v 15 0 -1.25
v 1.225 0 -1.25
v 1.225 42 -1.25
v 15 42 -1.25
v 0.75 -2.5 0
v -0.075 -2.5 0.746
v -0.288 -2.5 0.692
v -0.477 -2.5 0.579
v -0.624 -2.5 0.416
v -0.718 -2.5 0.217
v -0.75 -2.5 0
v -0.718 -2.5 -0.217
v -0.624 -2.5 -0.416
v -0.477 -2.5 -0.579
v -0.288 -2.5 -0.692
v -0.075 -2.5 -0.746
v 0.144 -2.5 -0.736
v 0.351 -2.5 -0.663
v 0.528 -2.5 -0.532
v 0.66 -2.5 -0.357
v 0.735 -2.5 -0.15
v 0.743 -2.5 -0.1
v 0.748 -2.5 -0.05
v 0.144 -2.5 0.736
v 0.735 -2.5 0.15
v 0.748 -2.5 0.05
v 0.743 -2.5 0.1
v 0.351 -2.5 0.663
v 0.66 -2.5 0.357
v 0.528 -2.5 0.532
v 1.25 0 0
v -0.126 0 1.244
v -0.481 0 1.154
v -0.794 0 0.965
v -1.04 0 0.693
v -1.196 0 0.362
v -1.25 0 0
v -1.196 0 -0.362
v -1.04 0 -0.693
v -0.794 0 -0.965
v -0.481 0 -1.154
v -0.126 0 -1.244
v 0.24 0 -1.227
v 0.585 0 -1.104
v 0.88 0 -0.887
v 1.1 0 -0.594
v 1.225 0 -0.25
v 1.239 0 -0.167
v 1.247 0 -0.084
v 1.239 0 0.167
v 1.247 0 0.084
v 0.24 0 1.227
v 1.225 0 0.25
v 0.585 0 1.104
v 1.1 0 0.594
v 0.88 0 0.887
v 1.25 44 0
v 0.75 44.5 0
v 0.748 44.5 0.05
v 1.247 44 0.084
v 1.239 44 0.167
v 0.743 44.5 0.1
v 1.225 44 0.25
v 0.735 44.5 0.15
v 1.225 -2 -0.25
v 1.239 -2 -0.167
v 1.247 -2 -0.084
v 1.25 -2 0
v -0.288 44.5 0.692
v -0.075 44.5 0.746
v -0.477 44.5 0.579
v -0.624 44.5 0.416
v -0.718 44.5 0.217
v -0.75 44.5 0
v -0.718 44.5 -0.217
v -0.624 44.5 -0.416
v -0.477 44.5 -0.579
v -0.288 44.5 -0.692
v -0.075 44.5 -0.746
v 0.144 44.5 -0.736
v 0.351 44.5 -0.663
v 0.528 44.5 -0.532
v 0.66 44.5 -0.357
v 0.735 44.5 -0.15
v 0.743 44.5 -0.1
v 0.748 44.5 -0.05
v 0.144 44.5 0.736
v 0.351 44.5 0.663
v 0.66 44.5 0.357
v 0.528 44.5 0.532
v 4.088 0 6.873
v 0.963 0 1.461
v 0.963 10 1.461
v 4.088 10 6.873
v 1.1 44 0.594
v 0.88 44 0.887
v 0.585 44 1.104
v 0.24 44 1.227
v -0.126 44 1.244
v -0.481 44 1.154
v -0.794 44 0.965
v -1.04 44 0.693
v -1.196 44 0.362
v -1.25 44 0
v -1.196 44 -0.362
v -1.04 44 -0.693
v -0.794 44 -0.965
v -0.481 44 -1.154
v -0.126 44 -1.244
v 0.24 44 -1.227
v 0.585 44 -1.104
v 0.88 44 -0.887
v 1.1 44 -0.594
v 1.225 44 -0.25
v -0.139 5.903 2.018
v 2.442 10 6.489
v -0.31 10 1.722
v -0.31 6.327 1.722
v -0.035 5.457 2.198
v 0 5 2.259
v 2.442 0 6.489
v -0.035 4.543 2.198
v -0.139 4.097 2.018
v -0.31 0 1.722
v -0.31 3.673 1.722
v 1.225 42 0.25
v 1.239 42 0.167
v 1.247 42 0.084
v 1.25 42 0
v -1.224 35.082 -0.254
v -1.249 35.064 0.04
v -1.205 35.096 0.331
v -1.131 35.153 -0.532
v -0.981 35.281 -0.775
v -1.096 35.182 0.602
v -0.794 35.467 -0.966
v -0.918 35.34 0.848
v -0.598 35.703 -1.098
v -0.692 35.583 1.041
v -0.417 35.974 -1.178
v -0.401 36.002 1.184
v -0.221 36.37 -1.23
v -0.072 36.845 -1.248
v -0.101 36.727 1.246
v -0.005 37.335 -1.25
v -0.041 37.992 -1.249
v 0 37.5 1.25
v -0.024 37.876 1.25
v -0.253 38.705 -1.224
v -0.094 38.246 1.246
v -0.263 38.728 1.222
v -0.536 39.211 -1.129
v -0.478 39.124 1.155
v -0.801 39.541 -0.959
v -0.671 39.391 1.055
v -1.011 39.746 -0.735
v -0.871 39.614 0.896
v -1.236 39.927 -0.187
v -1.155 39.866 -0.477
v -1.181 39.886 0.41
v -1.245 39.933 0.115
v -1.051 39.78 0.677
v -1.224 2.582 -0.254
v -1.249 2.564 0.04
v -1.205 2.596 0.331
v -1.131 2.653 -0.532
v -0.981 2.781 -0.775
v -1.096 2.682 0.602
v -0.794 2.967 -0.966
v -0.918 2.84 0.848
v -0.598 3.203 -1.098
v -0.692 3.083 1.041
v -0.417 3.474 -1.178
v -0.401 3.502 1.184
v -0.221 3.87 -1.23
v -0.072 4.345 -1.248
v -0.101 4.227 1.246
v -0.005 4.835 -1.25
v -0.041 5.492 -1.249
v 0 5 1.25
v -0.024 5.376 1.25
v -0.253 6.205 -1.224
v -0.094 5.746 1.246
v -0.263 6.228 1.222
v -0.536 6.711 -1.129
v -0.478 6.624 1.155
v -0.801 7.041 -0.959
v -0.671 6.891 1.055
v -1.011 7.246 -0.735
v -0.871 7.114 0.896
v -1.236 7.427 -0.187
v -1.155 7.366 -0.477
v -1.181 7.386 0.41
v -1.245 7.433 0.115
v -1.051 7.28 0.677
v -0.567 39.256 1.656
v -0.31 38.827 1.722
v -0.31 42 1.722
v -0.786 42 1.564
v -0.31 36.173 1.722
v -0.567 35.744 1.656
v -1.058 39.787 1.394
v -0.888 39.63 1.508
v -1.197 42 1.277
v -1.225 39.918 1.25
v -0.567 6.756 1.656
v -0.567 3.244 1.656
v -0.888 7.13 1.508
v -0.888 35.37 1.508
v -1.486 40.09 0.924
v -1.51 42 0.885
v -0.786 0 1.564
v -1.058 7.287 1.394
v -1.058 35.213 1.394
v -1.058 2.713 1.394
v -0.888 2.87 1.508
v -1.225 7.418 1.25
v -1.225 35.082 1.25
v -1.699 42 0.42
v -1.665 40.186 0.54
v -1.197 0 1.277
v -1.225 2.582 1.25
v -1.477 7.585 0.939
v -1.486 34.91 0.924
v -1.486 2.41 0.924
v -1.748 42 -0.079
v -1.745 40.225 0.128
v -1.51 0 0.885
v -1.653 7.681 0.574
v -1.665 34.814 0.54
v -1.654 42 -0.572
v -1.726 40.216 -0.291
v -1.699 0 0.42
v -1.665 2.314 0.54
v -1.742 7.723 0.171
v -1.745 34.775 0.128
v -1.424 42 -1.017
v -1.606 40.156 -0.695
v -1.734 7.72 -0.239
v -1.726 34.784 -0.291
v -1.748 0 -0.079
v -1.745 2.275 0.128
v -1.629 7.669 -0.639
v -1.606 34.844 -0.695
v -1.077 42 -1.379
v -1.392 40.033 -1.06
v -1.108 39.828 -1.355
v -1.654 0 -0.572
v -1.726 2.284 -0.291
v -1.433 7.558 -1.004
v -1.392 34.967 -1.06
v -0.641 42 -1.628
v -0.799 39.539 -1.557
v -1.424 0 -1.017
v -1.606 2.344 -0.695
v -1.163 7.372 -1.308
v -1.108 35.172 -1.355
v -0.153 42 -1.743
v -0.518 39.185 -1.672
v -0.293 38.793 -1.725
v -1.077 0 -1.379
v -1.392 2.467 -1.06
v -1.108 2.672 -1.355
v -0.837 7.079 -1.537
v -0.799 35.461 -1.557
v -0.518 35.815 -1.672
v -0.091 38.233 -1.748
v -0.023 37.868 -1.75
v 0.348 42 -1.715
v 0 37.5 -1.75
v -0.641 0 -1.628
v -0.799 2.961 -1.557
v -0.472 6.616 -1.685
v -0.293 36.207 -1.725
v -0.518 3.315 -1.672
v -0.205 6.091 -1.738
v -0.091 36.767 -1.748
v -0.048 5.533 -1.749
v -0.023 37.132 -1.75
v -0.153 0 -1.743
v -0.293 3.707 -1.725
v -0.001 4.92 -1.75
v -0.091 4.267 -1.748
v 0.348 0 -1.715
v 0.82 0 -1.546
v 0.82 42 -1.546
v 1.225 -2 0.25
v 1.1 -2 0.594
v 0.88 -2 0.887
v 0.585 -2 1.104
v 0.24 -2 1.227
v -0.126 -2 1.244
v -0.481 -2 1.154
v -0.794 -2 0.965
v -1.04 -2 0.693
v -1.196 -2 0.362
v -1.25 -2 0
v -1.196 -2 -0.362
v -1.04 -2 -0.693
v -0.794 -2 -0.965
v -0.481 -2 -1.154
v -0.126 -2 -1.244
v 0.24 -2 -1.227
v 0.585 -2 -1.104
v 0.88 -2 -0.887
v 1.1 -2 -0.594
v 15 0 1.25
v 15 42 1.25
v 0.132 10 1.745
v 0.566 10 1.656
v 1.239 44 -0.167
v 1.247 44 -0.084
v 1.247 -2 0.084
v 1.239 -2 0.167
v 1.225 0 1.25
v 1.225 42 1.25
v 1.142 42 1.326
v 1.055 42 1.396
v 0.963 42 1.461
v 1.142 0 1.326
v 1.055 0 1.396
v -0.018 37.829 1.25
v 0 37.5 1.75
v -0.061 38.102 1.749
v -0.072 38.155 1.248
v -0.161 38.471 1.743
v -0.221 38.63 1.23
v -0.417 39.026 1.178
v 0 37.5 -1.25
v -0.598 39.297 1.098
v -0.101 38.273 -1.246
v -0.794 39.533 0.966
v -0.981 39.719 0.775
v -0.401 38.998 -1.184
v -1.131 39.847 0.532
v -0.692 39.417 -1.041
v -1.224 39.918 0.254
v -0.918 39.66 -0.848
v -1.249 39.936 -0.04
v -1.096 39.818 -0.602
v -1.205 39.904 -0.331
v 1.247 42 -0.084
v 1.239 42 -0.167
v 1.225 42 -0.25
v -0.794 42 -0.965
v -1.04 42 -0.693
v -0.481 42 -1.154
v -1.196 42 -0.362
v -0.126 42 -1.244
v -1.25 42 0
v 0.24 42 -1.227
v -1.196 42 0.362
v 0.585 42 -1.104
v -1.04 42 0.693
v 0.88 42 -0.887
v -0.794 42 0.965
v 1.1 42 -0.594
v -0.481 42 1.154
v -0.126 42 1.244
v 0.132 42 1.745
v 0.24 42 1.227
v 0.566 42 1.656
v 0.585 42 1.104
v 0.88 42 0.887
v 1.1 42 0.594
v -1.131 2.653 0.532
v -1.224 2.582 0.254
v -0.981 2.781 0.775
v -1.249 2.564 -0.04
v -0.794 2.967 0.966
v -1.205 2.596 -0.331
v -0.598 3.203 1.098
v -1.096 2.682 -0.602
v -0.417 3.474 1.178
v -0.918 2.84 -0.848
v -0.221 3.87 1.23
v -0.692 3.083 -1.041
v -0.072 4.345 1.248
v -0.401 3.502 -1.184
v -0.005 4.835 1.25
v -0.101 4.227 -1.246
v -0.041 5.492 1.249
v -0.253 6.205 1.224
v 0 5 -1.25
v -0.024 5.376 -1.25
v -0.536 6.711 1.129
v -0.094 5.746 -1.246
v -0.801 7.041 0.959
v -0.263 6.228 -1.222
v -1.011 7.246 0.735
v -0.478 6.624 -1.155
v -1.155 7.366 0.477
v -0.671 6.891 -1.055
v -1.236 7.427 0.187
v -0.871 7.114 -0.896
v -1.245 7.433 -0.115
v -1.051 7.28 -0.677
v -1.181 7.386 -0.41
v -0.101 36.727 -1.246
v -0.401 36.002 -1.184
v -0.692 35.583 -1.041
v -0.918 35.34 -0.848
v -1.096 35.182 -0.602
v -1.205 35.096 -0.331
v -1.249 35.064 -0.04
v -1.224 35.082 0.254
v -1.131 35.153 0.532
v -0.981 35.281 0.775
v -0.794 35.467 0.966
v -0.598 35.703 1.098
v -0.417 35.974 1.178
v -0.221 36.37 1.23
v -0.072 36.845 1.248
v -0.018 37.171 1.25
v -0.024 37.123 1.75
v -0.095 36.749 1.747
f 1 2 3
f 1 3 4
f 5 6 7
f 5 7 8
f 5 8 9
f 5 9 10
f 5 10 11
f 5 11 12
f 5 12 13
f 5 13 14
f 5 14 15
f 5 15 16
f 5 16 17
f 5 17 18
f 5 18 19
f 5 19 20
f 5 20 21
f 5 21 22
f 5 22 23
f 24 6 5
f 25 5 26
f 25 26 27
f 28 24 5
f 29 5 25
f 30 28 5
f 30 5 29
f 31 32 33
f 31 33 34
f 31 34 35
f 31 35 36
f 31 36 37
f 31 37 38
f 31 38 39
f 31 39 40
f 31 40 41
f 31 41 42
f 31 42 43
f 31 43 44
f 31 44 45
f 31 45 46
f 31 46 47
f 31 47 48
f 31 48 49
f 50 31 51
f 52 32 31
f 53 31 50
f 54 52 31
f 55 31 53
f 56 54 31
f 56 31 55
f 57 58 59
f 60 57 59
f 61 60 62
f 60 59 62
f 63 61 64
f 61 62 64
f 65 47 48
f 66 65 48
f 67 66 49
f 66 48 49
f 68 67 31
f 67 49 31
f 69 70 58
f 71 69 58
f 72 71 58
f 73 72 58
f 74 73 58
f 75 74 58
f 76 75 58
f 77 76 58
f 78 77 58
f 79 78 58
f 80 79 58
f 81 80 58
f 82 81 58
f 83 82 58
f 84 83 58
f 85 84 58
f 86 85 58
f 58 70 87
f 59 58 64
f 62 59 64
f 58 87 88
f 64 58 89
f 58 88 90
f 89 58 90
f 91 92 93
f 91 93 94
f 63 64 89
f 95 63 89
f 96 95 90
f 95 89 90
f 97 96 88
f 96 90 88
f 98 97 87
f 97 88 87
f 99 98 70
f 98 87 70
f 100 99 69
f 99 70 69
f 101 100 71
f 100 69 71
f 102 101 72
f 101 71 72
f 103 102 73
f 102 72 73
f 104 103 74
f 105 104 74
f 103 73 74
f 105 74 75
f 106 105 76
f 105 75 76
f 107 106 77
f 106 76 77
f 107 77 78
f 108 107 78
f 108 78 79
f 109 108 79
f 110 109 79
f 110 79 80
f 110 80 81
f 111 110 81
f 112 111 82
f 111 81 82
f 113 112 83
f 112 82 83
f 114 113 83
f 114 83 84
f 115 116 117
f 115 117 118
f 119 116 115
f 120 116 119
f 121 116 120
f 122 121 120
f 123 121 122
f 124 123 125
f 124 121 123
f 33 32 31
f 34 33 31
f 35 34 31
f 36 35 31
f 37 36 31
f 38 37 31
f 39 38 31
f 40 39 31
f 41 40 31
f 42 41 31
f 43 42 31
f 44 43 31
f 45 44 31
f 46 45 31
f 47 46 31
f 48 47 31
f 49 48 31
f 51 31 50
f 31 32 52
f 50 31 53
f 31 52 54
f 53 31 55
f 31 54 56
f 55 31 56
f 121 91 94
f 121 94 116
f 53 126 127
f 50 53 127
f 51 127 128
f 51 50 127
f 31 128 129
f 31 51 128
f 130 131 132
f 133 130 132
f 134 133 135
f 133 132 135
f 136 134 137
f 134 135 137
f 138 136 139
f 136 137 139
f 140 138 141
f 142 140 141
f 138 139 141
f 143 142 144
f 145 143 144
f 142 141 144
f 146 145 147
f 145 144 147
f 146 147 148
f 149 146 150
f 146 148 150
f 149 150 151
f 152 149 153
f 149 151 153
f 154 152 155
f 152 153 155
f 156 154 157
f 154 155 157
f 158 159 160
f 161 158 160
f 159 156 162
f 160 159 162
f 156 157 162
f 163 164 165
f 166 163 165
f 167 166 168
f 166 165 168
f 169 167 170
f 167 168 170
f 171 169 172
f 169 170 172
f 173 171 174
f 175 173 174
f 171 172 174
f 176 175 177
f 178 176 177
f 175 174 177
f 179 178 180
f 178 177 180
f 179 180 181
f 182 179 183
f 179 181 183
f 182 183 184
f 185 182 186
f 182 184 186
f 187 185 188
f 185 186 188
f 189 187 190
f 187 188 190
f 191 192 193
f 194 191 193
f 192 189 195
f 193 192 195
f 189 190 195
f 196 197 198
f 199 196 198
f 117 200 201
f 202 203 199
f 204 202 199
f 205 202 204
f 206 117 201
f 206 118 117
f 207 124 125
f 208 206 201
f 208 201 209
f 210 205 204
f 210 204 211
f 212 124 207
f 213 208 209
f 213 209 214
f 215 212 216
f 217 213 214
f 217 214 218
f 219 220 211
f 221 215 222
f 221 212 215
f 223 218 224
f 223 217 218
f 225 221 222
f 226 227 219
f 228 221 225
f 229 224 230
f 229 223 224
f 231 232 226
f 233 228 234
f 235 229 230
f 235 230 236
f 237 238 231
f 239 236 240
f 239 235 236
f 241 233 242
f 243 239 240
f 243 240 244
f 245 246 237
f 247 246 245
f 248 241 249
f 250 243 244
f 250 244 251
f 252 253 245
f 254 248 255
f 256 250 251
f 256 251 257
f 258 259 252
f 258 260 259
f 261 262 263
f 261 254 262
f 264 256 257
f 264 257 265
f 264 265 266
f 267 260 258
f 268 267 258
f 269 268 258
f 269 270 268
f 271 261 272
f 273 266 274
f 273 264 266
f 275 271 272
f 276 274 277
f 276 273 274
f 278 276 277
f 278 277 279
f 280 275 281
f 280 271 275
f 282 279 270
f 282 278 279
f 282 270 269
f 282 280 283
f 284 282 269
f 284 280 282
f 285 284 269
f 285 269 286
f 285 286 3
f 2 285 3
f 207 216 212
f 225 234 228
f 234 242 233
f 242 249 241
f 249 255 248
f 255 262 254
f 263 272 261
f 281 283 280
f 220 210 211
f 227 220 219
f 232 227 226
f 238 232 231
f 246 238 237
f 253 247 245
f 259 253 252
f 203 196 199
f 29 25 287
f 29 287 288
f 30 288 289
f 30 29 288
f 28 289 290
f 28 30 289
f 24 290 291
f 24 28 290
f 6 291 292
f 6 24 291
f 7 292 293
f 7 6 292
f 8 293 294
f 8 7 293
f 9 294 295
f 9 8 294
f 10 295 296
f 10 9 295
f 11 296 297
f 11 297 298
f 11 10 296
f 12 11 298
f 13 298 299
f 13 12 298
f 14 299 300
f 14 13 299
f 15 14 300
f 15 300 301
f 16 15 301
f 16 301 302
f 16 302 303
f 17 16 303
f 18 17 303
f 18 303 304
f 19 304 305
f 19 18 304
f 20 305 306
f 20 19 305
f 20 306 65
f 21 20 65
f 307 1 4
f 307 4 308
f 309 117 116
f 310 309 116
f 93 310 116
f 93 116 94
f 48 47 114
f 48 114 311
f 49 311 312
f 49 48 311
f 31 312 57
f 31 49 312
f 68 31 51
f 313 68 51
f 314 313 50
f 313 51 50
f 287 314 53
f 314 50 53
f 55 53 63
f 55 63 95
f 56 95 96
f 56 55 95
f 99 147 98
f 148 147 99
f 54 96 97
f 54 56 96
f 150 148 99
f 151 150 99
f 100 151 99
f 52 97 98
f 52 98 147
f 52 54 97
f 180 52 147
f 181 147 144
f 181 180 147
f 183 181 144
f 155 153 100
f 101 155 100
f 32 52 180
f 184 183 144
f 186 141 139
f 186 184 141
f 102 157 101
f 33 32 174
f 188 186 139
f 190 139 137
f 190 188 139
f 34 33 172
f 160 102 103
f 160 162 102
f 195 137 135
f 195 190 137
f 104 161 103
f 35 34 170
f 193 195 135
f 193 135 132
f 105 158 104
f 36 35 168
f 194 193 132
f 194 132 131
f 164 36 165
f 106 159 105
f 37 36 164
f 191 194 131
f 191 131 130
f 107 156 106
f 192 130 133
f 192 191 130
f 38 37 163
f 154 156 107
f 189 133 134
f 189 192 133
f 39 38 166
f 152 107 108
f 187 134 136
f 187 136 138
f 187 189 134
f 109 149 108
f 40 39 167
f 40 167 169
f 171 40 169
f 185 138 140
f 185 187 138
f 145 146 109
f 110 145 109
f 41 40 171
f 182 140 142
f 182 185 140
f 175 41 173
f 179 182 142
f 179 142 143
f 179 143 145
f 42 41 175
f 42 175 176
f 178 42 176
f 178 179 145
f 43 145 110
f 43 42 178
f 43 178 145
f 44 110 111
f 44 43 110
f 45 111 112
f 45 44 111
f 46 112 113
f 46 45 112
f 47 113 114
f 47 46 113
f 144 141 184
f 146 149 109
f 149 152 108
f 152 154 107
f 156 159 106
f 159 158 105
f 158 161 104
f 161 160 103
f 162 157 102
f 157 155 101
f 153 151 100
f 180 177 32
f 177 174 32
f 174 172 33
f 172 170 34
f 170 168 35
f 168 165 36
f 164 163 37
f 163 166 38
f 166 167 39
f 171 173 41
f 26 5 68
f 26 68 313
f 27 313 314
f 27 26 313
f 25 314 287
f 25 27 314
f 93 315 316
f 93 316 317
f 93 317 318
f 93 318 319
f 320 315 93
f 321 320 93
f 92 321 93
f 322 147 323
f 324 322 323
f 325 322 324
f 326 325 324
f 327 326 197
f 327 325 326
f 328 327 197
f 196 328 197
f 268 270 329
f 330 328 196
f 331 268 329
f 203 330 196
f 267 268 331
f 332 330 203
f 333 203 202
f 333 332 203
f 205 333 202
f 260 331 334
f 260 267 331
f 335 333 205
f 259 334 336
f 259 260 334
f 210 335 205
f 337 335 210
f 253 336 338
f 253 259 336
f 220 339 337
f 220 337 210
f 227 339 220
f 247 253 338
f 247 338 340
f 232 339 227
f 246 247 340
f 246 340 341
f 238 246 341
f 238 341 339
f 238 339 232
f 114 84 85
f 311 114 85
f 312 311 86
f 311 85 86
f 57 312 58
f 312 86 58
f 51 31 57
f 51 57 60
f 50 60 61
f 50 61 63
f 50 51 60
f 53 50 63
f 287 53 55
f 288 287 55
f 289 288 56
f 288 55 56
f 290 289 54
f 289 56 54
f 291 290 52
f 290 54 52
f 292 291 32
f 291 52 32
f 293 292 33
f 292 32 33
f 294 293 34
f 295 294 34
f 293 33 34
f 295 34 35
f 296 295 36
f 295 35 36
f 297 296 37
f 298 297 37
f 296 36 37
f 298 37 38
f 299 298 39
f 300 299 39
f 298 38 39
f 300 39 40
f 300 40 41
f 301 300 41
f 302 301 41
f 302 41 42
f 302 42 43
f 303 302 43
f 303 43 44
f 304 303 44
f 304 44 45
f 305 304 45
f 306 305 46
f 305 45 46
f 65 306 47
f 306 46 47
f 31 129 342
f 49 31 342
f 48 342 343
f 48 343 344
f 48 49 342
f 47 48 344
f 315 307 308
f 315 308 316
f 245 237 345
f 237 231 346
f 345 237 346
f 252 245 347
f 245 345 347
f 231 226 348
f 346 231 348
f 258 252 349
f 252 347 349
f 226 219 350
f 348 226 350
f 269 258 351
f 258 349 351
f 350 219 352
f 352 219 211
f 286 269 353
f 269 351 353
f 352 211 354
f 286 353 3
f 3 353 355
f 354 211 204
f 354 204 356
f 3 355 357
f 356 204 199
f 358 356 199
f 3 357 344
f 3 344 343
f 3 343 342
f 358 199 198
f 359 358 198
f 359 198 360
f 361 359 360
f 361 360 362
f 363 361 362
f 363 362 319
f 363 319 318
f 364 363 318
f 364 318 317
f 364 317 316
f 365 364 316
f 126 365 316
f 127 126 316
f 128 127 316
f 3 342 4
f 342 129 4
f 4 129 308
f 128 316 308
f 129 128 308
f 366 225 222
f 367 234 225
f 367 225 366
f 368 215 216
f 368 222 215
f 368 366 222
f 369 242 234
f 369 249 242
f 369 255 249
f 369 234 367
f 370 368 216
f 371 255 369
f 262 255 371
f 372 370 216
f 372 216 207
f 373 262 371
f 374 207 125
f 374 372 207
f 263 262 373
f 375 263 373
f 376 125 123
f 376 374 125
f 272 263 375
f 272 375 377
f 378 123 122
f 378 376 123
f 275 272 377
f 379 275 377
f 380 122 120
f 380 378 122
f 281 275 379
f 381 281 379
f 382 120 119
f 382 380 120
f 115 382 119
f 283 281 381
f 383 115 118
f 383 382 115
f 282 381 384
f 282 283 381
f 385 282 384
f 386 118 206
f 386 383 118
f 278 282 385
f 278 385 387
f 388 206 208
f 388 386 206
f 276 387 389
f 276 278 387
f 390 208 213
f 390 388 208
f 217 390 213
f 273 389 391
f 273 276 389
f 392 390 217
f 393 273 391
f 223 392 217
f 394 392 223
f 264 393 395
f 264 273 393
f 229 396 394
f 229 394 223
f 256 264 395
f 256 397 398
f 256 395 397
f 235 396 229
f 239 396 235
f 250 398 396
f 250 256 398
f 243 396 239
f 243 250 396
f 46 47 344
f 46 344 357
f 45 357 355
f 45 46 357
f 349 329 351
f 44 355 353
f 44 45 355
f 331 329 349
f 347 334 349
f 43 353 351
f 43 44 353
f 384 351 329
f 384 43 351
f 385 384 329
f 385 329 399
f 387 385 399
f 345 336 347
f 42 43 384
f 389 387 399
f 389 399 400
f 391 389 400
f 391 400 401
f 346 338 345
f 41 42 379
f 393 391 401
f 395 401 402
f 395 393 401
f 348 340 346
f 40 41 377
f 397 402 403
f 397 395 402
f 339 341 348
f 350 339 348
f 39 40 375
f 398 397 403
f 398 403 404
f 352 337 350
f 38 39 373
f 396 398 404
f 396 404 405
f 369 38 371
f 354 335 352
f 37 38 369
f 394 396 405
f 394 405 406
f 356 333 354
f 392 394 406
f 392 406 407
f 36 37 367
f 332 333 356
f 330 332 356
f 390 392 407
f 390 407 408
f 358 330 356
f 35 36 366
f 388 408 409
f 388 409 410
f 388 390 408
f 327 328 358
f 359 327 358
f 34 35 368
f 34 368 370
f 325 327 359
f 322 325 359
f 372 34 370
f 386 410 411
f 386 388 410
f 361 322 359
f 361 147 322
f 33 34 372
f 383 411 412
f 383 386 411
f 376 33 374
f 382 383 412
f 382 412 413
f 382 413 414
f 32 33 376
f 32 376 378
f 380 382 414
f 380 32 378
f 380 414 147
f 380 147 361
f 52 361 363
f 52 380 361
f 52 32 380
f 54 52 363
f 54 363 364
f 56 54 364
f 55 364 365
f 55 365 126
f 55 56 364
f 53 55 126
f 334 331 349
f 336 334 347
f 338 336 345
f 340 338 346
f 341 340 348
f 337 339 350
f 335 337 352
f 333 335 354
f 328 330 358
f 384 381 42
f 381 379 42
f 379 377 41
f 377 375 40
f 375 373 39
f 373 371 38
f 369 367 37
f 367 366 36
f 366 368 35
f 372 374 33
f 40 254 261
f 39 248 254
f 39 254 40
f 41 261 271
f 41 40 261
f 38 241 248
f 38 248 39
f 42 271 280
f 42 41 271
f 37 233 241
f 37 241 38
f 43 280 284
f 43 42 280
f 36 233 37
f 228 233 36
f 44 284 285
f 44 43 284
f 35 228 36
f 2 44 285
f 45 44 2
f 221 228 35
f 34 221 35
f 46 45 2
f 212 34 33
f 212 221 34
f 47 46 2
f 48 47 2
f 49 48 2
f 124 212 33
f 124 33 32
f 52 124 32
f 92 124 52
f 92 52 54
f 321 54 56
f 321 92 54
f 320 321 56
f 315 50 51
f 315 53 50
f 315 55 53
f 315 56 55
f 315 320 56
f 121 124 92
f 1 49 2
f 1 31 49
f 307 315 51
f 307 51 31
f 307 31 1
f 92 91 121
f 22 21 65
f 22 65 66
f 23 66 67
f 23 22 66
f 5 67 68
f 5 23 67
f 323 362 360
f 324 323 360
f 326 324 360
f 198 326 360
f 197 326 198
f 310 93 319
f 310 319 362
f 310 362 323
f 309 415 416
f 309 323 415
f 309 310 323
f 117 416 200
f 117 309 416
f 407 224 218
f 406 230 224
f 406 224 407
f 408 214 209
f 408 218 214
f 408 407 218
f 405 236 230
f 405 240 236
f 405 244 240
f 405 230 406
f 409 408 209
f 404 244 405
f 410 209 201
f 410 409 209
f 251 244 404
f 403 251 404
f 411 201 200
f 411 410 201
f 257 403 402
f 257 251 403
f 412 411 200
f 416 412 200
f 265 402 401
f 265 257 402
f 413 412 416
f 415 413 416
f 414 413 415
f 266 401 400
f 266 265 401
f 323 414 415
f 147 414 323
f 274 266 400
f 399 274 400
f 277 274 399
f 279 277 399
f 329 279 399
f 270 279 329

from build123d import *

# Parameters (mm, degrees)
F1_DEPTH      = 2.5
F2_SIZE       = 0.5
F3_DEPTH      = 42
F4_DEPTH      = 44.5
F5_SIZE       = 0.5
F7_DEPTH      = 10
F6_R          = 3
F8_DEPTH      = 10
F8_DEPTH_BACK = 10


with BuildPart() as f1:
    # F0 (on Front) → F1 (new body)
    with BuildSketch(Plane.XZ):
        with BuildLine():
            Line((1.2247448714, -0.25), (1.2247448714, 0.25))
            ThreePointArc((1.2247448714, 0.25), (-1.25, 0), (1.2247448714, -0.25))
        make_face()
        with BuildLine():
            ThreePointArc((1.25, 0), (1.2436701913, 0.1256362025), (1.2247448714, 0.25))
            Line((1.2247448714, 0.25), (1.2247448714, -0.25))
            ThreePointArc((1.2247448714, -0.25), (1.2436701913, -0.1256362025), (1.25, 0))
        make_face()
    extrude(amount=F1_DEPTH)

    # F2
    f2_edges = [f1.edges().sort_by_distance(p)[0] for p in [
        (-1.224745, -2.5, 0.25),
    ]]
    chamfer(f2_edges, length=F2_SIZE)

    # F0 (on Front) → F3 (join)
    with BuildSketch(Plane.XZ):
        with BuildLine():
            ThreePointArc((1.2247448714, 1.25), (1.6133510971, 0.6779367504), (1.75, 0))
            ThreePointArc((1.75, 0), (1.6133510971, -0.6779367504), (1.2247448714, -1.25))
            Line((1.2247448714, -1.25), (15, -1.25))
            Line((15, -1.25), (15, 1.25))
            Line((15, 1.25), (1.2247448714, 1.25))
        make_face()
        with BuildLine():
            Line((1.2247448714, 0.25), (1.2247448714, 1.25))
            ThreePointArc((1.2247448714, 1.25), (1.0990782163, 1.3618102197), (0.9632574662, 1.4610390323))
            ThreePointArc((0.9632574662, 1.4610390323), (0.3519402911, 1.7142456159), (-0.3096911027, 1.722379581))
            ThreePointArc((-0.3096911027, 1.722379581), (-1.5550212035, -0.8027509307), (1.2247448714, -1.25))
            Line((1.2247448714, -1.25), (1.2247448714, -0.25))
            ThreePointArc((1.2247448714, -0.25), (-1.25, 0), (1.2247448714, 0.25))
        make_face()
        with BuildLine():
            ThreePointArc((1.2247448714, -1.25), (1.6133510971, -0.6779367504), (1.75, 0))
            ThreePointArc((1.75, 0), (1.6133510971, 0.6779367504), (1.2247448714, 1.25))
            Line((1.2247448714, 1.25), (1.2247448714, 0.25))
            ThreePointArc((1.2247448714, 0.25), (1.2436701913, 0.1256362025), (1.25, 0))
            ThreePointArc((1.25, 0), (1.2436701913, -0.1256362025), (1.2247448714, -0.25))
            Line((1.2247448714, -0.25), (1.2247448714, -1.25))
        make_face()
    extrude(amount=-F3_DEPTH)

    # F0 (on Front) → F7 (join)
    with BuildSketch(Plane.XZ):
        with BuildLine():
            ThreePointArc((-0.3096911027, 1.722379581), (0.3519402911, 1.7142456159), (0.9632574662, 1.4610390323))
            Line((0.9632574662, 1.4610390323), (4.0880007002, 6.8732530742))
            Line((4.0880007002, 6.8732530742), (2.4424443742, 6.4892180562))
            Line((2.4424443742, 6.4892180562), (-0.3096911027, 1.722379581))
        make_face()
    extrude(amount=-F7_DEPTH)


with BuildPart() as f4:
    # F0 (on Front) → F4 (new body)
    with BuildSketch(Plane.XZ):
        with BuildLine():
            Line((1.2247448714, -0.25), (1.2247448714, 0.25))
            ThreePointArc((1.2247448714, 0.25), (-1.25, 0), (1.2247448714, -0.25))
        make_face()
        with BuildLine():
            ThreePointArc((1.25, 0), (1.2436701913, 0.1256362025), (1.2247448714, 0.25))
            Line((1.2247448714, 0.25), (1.2247448714, -0.25))
            ThreePointArc((1.2247448714, -0.25), (1.2436701913, -0.1256362025), (1.25, 0))
        make_face()
    extrude(amount=-F4_DEPTH)

    # F5
    f5_edges = [f4.edges().sort_by_distance(p)[0] for p in [
        (-1.224745, 44.5, 0.25),
    ]]
    chamfer(f5_edges, length=F5_SIZE)


with BuildPart() as f8_tool:
    # F6 (on face) → F8 (new body, two sides)
    with BuildSketch(Plane.XY.offset(1.25)) as f8_sk:
        with Locations((-3, 37.5)):
            Circle(F6_R)
        with Locations((-3, 5)):
            Circle(F6_R)
    extrude(amount=-F8_DEPTH)
    extrude(f8_sk.sketch, amount=F8_DEPTH_BACK)


with BuildPart() as f1_1:
    add(f1.part)

    # F8: cut by f8_tool
    add(f8_tool.part, mode=Mode.SUBTRACT)


with BuildPart() as f4_1:
    add(f4.part)

    # F8: cut by f8_tool
    add(f8_tool.part, mode=Mode.SUBTRACT)


solid = Compound([f1_1.part, f4_1.part])
